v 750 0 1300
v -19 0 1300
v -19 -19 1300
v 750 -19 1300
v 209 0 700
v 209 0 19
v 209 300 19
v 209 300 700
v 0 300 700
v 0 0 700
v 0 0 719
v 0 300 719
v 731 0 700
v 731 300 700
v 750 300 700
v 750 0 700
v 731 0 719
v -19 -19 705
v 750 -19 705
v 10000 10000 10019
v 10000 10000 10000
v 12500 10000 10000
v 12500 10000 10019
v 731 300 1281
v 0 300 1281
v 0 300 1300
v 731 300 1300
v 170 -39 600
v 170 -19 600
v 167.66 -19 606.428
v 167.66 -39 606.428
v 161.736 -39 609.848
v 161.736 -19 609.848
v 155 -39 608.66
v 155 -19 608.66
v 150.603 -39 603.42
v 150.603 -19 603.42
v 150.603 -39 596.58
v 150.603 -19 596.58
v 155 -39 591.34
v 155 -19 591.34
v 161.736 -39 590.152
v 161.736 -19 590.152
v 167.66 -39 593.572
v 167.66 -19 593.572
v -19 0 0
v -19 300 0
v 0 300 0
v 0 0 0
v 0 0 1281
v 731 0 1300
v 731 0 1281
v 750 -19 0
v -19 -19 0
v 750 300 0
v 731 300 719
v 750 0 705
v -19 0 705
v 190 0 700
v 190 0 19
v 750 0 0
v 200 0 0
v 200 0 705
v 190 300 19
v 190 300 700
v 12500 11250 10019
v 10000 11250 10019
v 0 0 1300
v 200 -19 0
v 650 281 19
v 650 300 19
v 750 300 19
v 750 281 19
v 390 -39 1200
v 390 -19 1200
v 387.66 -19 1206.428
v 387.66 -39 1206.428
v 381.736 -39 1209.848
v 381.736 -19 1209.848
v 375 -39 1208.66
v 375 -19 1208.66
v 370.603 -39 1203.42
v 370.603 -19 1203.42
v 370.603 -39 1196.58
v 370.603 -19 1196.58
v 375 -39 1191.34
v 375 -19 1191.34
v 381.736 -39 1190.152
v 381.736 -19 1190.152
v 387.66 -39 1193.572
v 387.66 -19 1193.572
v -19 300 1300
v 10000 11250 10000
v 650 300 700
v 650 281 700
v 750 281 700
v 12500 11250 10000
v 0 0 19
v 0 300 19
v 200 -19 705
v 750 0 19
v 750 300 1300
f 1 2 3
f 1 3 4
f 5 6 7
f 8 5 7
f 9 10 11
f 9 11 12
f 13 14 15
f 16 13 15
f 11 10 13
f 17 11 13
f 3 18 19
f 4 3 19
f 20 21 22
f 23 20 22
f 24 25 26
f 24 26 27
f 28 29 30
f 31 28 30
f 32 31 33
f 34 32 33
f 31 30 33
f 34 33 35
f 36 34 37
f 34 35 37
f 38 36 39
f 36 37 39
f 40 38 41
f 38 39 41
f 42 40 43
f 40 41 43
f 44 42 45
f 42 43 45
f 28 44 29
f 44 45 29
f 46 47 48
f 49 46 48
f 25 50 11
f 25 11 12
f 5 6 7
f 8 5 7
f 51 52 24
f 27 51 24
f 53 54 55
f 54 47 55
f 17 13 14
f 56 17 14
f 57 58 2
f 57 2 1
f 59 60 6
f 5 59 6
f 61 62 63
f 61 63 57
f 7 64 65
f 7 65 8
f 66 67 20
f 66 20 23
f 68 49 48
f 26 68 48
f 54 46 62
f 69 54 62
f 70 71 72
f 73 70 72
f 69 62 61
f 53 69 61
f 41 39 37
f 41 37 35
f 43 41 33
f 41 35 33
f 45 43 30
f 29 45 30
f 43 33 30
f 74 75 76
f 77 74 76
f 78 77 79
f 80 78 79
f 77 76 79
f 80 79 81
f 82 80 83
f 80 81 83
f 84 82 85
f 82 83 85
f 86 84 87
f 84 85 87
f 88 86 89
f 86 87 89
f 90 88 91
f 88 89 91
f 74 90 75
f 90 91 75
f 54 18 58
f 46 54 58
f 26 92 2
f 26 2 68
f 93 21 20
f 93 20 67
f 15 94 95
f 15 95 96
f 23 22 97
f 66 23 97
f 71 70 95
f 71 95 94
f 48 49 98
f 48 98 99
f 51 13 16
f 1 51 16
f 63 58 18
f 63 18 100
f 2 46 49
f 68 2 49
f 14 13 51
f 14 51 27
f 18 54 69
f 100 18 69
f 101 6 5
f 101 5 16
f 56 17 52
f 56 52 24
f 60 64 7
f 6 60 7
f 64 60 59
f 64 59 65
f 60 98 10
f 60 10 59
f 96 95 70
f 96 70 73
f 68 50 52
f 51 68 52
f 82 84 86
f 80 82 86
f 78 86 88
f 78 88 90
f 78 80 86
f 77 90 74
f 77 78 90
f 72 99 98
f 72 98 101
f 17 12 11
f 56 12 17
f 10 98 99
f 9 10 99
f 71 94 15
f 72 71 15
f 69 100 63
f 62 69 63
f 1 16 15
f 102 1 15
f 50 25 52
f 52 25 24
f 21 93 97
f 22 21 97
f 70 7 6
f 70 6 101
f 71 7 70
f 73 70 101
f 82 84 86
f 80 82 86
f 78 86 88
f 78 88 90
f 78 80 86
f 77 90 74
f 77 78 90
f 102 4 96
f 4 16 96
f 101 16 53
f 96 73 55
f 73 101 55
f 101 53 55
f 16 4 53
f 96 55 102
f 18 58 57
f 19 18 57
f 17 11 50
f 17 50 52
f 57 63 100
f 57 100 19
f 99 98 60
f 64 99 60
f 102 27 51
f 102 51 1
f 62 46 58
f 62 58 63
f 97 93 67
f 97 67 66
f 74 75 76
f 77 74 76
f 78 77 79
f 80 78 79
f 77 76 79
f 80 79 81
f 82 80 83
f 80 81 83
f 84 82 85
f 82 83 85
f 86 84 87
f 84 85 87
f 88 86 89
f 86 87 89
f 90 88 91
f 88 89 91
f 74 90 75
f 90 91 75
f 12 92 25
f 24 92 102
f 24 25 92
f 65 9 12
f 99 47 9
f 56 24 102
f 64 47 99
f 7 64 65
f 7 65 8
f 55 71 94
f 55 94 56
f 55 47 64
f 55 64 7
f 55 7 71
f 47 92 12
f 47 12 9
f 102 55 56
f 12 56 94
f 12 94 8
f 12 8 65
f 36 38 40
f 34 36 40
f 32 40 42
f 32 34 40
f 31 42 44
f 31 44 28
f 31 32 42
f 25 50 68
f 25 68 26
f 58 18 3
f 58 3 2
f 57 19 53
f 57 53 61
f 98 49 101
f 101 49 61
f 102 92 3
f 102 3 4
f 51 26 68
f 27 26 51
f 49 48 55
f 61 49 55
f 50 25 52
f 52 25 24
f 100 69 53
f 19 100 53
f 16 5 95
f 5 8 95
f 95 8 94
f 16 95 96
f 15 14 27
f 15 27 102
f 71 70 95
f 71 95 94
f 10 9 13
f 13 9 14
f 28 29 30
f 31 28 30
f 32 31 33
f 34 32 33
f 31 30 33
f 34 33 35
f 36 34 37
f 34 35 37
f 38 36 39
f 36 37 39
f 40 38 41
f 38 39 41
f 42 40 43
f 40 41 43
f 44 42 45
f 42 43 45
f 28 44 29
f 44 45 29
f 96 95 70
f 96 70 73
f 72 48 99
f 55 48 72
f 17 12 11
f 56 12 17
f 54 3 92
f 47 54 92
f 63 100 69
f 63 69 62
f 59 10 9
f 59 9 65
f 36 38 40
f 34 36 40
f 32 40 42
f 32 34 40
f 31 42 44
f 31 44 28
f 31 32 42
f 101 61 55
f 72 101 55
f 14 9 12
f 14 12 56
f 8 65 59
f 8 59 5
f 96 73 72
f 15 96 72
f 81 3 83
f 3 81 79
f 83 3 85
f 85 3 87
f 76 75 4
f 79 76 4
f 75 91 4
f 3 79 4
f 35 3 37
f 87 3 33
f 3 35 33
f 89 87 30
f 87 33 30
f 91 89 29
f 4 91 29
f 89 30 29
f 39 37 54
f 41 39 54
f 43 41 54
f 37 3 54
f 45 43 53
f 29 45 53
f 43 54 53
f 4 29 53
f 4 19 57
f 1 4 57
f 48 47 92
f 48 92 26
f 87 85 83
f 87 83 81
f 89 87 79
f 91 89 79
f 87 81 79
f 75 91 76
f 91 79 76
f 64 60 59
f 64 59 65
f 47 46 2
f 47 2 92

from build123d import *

# Parameters (mm, degrees)
BOX_W                  = 750
BOX_H                  = 300
BOX_DEPTH              = 19
BOX001_W               = 731
BOX001_H               = 300
BOX001_DEPTH           = 19
BOX002_W               = 731
BOX002_H               = 300
BOX002_DEPTH           = 19
BOX003_W               = 19
BOX003_H               = 300
BOX003_DEPTH           = 1300
BOX004_W               = 19
BOX004_H               = 300
BOX004_DEPTH           = 600
BOX005_W               = 550
BOX005_H               = 19
BOX005_DEPTH           = 705
BOX006_W               = 219
BOX006_H               = 19
BOX006_DEPTH           = 705
BOX007_W               = 19
BOX007_H               = 300
BOX007_DEPTH           = 681
BOX008_W               = 769
BOX008_H               = 19
BOX008_DEPTH           = 595
BOX009_W               = 100
BOX009_H               = 19
BOX009_DEPTH           = 681
CYLINDER_R             = 10
CYLINDER_DEPTH         = 20
CYLINDER_ROLL_ANGLE    = 90
CYLINDER001_R          = 10
CYLINDER001_DEPTH      = 20
CYLINDER001_ROLL_ANGLE = 90
BOX011_W               = 731
BOX011_H               = 300
BOX011_DEPTH           = 19
BOX012_W               = 731
BOX012_H               = 300
BOX012_DEPTH           = 19
BOX013_W               = 19
BOX013_H               = 300
BOX013_DEPTH           = 1300
BOX014_W               = 19
BOX014_H               = 300
BOX014_DEPTH           = 600
BOX015_W               = 550
BOX015_H               = 19
BOX015_DEPTH           = 705
BOX016_W               = 219
BOX016_H               = 19
BOX016_DEPTH           = 705
BOX017_W               = 19
BOX017_H               = 300
BOX017_DEPTH           = 681
BOX018_W               = 769
BOX018_H               = 19
BOX018_DEPTH           = 595
BOX019_W               = 100
BOX019_H               = 19
BOX019_DEPTH           = 681
CYLINDER002_R          = 10
CYLINDER002_DEPTH      = 20
CYLINDER002_ROLL_ANGLE = 90
CYLINDER003_R          = 10
CYLINDER003_DEPTH      = 20
CYLINDER003_ROLL_ANGLE = 90
BOX010_W               = 750
BOX010_H               = 300
BOX010_DEPTH           = 19
BOX020_W               = 2500
BOX020_H               = 1250
BOX020_DEPTH           = 19


with BuildPart() as boden:
    # Box → Box (new body)
    with BuildSketch(Plane.XY):
        with Locations((375, 150)):
            Rectangle(BOX_W, BOX_H)
    extrude(amount=BOX_DEPTH)


with BuildPart() as mittelebene:
    # Box001 → Box001 (new body)
    with BuildSketch(Plane.XY.offset(700)):
        with Locations((365.5, 150)):
            Rectangle(BOX001_W, BOX001_H)
    extrude(amount=BOX001_DEPTH)


with BuildPart() as deckel:
    # Box002 → Box002 (new body)
    with BuildSketch(Plane.XY.offset(1281)):
        with Locations((365.5, 150)):
            Rectangle(BOX002_W, BOX002_H)
    extrude(amount=BOX002_DEPTH)


with BuildPart() as seiteli:
    # Box003 → Box003 (new body)
    with BuildSketch(Plane(origin=(-19, 0, 0), x_dir=(1, 0, 0), z_dir=(0, 0, 1))):
        with Locations((9.5, 150)):
            Rectangle(BOX003_W, BOX003_H)
    extrude(amount=BOX003_DEPTH)


with BuildPart() as seitere:
    # Box004 → Box004 (new body)
    with BuildSketch(Plane(origin=(731, 0, 700), x_dir=(1, 0, 0), z_dir=(0, 0, 1))):
        with Locations((9.5, 150)):
            Rectangle(BOX004_W, BOX004_H)
    extrude(amount=BOX004_DEPTH)


with BuildPart() as abdeckungvo:
    # Box005 → Box005 (new body)
    with BuildSketch(Plane(origin=(200, -19, 0), x_dir=(1, 0, 0), z_dir=(0, 0, 1))):
        with Locations((275, 9.5)):
            Rectangle(BOX005_W, BOX005_H)
    extrude(amount=BOX005_DEPTH)


with BuildPart() as tuere:
    # Box006 → Box006 (new body)
    with BuildSketch(Plane(origin=(-19, -19, 0), x_dir=(1, 0, 0), z_dir=(0, 0, 1))):
        with Locations((109.5, 9.5)):
            Rectangle(BOX006_W, BOX006_H)
    extrude(amount=BOX006_DEPTH)


with BuildPart() as stuetzemi:
    # Box007 → Box007 (new body)
    with BuildSketch(Plane(origin=(190, 0, 19), x_dir=(1, 0, 0), z_dir=(0, 0, 1))):
        with Locations((9.5, 150)):
            Rectangle(BOX007_W, BOX007_H)
    extrude(amount=BOX007_DEPTH)


with BuildPart() as klappe:
    # Box008 → Box008 (new body)
    with BuildSketch(Plane(origin=(-19, -19, 705), x_dir=(1, 0, 0), z_dir=(0, 0, 1))):
        with Locations((384.5, 9.5)):
            Rectangle(BOX008_W, BOX008_H)
    extrude(amount=BOX008_DEPTH)


with BuildPart() as stuetzehi:
    # Box009 → Box009 (new body)
    with BuildSketch(Plane(origin=(650, 281, 19), x_dir=(1, 0, 0), z_dir=(0, 0, 1))):
        with Locations((50, 9.5)):
            Rectangle(BOX009_W, BOX009_H)
    extrude(amount=BOX009_DEPTH)


with BuildPart() as grifftuere:
    # Cylinder → Cylinder (new body)
    with BuildSketch(Plane.XY):
        Circle(CYLINDER_R)
    extrude(amount=CYLINDER_DEPTH)


with BuildPart() as grifftuere_1:
    # Cylinder roll: moved
    add(grifftuere.part.rotate(Axis((0, 0, 0), (1, 0, 0)), CYLINDER_ROLL_ANGLE))


with BuildPart() as grifftuere_2:
    # Cylinder placement: moved
    add(grifftuere_1.part.moved(Location((160, -19, 600))))


with BuildPart() as griffklappe:
    # Cylinder001 → Cylinder001 (new body)
    with BuildSketch(Plane.XY):
        Circle(CYLINDER001_R)
    extrude(amount=CYLINDER001_DEPTH)


with BuildPart() as griffklappe_1:
    # Cylinder001 roll: moved
    add(griffklappe.part.rotate(Axis((0, 0, 0), (1, 0, 0)), CYLINDER001_ROLL_ANGLE))


with BuildPart() as griffklappe_2:
    # Cylinder001 placement: moved
    add(griffklappe_1.part.moved(Location((380, -19, 1200))))


with BuildPart() as mittelebene001:
    # Box011 → Box011 (new body)
    with BuildSketch(Plane.XY.offset(700)):
        with Locations((365.5, 150)):
            Rectangle(BOX011_W, BOX011_H)
    extrude(amount=BOX011_DEPTH)


with BuildPart() as deckel001:
    # Box012 → Box012 (new body)
    with BuildSketch(Plane.XY.offset(1281)):
        with Locations((365.5, 150)):
            Rectangle(BOX012_W, BOX012_H)
    extrude(amount=BOX012_DEPTH)


with BuildPart() as seiteli001:
    # Box013 → Box013 (new body)
    with BuildSketch(Plane(origin=(-19, 0, 0), x_dir=(1, 0, 0), z_dir=(0, 0, 1))):
        with Locations((9.5, 150)):
            Rectangle(BOX013_W, BOX013_H)
    extrude(amount=BOX013_DEPTH)


with BuildPart() as seitere001:
    # Box014 → Box014 (new body)
    with BuildSketch(Plane(origin=(731, 0, 700), x_dir=(1, 0, 0), z_dir=(0, 0, 1))):
        with Locations((9.5, 150)):
            Rectangle(BOX014_W, BOX014_H)
    extrude(amount=BOX014_DEPTH)


with BuildPart() as abdeckungvo001:
    # Box015 → Box015 (new body)
    with BuildSketch(Plane(origin=(200, -19, 0), x_dir=(1, 0, 0), z_dir=(0, 0, 1))):
        with Locations((275, 9.5)):
            Rectangle(BOX015_W, BOX015_H)
    extrude(amount=BOX015_DEPTH)


with BuildPart() as tuere001:
    # Box016 → Box016 (new body)
    with BuildSketch(Plane(origin=(-19, -19, 0), x_dir=(1, 0, 0), z_dir=(0, 0, 1))):
        with Locations((109.5, 9.5)):
            Rectangle(BOX016_W, BOX016_H)
    extrude(amount=BOX016_DEPTH)


with BuildPart() as stuetzemi001:
    # Box017 → Box017 (new body)
    with BuildSketch(Plane(origin=(190, 0, 19), x_dir=(1, 0, 0), z_dir=(0, 0, 1))):
        with Locations((9.5, 150)):
            Rectangle(BOX017_W, BOX017_H)
    extrude(amount=BOX017_DEPTH)


with BuildPart() as klappe001:
    # Box018 → Box018 (new body)
    with BuildSketch(Plane(origin=(-19, -19, 705), x_dir=(1, 0, 0), z_dir=(0, 0, 1))):
        with Locations((384.5, 9.5)):
            Rectangle(BOX018_W, BOX018_H)
    extrude(amount=BOX018_DEPTH)


with BuildPart() as stuetzehi001:
    # Box019 → Box019 (new body)
    with BuildSketch(Plane(origin=(650, 281, 19), x_dir=(1, 0, 0), z_dir=(0, 0, 1))):
        with Locations((50, 9.5)):
            Rectangle(BOX019_W, BOX019_H)
    extrude(amount=BOX019_DEPTH)


with BuildPart() as grifftuere001:
    # Cylinder002 → Cylinder002 (new body)
    with BuildSketch(Plane.XY):
        Circle(CYLINDER002_R)
    extrude(amount=CYLINDER002_DEPTH)


with BuildPart() as grifftuere001_1:
    # Cylinder002 roll: moved
    add(grifftuere001.part.rotate(Axis((0, 0, 0), (1, 0, 0)), CYLINDER002_ROLL_ANGLE))


with BuildPart() as grifftuere001_2:
    # Cylinder002 placement: moved
    add(grifftuere001_1.part.moved(Location((160, -19, 600))))


with BuildPart() as griffklappe001:
    # Cylinder003 → Cylinder003 (new body)
    with BuildSketch(Plane.XY):
        Circle(CYLINDER003_R)
    extrude(amount=CYLINDER003_DEPTH)


with BuildPart() as griffklappe001_1:
    # Cylinder003 roll: moved
    add(griffklappe001.part.rotate(Axis((0, 0, 0), (1, 0, 0)), CYLINDER003_ROLL_ANGLE))


with BuildPart() as griffklappe001_2:
    # Cylinder003 placement: moved
    add(griffklappe001_1.part.moved(Location((380, -19, 1200))))


with BuildPart() as connect:
    # Box010 → Box010 (new body)
    with BuildSketch(Plane.XY):
        with Locations((375, 150)):
            Rectangle(BOX010_W, BOX010_H)
    extrude(amount=BOX010_DEPTH)

    # Connect: union Mittelebene001, Deckel001, SeiteLi001, SeiteRe001, AbdeckungVo001, Tuere001, StuetzeMi001, Klappe001, StuetzeHi001, GriffTuere001, GriffKlappe001
    add(mittelebene001.part)
    add(deckel001.part)
    add(seiteli001.part)
    add(seitere001.part)
    add(abdeckungvo001.part)
    add(tuere001.part)
    add(stuetzemi001.part)
    add(klappe001.part)
    add(stuetzehi001.part)
    add(grifftuere001_2.part)
    add(griffklappe001_2.part)


with BuildPart() as w_rfel:
    # Box020 → Box020 (new body)
    with BuildSketch(Plane(origin=(10000, 10000, 10000), x_dir=(1, 0, 0), z_dir=(0, 0, 1))):
        with Locations((1250, 625)):
            Rectangle(BOX020_W, BOX020_H)
    extrude(amount=BOX020_DEPTH)


solid = Compound([boden.part, mittelebene.part, deckel.part, seiteli.part, seitere.part, abdeckungvo.part, tuere.part, stuetzemi.part, klappe.part, stuetzehi.part, grifftuere_2.part, griffklappe_2.part, connect.part, w_rfel.part])
